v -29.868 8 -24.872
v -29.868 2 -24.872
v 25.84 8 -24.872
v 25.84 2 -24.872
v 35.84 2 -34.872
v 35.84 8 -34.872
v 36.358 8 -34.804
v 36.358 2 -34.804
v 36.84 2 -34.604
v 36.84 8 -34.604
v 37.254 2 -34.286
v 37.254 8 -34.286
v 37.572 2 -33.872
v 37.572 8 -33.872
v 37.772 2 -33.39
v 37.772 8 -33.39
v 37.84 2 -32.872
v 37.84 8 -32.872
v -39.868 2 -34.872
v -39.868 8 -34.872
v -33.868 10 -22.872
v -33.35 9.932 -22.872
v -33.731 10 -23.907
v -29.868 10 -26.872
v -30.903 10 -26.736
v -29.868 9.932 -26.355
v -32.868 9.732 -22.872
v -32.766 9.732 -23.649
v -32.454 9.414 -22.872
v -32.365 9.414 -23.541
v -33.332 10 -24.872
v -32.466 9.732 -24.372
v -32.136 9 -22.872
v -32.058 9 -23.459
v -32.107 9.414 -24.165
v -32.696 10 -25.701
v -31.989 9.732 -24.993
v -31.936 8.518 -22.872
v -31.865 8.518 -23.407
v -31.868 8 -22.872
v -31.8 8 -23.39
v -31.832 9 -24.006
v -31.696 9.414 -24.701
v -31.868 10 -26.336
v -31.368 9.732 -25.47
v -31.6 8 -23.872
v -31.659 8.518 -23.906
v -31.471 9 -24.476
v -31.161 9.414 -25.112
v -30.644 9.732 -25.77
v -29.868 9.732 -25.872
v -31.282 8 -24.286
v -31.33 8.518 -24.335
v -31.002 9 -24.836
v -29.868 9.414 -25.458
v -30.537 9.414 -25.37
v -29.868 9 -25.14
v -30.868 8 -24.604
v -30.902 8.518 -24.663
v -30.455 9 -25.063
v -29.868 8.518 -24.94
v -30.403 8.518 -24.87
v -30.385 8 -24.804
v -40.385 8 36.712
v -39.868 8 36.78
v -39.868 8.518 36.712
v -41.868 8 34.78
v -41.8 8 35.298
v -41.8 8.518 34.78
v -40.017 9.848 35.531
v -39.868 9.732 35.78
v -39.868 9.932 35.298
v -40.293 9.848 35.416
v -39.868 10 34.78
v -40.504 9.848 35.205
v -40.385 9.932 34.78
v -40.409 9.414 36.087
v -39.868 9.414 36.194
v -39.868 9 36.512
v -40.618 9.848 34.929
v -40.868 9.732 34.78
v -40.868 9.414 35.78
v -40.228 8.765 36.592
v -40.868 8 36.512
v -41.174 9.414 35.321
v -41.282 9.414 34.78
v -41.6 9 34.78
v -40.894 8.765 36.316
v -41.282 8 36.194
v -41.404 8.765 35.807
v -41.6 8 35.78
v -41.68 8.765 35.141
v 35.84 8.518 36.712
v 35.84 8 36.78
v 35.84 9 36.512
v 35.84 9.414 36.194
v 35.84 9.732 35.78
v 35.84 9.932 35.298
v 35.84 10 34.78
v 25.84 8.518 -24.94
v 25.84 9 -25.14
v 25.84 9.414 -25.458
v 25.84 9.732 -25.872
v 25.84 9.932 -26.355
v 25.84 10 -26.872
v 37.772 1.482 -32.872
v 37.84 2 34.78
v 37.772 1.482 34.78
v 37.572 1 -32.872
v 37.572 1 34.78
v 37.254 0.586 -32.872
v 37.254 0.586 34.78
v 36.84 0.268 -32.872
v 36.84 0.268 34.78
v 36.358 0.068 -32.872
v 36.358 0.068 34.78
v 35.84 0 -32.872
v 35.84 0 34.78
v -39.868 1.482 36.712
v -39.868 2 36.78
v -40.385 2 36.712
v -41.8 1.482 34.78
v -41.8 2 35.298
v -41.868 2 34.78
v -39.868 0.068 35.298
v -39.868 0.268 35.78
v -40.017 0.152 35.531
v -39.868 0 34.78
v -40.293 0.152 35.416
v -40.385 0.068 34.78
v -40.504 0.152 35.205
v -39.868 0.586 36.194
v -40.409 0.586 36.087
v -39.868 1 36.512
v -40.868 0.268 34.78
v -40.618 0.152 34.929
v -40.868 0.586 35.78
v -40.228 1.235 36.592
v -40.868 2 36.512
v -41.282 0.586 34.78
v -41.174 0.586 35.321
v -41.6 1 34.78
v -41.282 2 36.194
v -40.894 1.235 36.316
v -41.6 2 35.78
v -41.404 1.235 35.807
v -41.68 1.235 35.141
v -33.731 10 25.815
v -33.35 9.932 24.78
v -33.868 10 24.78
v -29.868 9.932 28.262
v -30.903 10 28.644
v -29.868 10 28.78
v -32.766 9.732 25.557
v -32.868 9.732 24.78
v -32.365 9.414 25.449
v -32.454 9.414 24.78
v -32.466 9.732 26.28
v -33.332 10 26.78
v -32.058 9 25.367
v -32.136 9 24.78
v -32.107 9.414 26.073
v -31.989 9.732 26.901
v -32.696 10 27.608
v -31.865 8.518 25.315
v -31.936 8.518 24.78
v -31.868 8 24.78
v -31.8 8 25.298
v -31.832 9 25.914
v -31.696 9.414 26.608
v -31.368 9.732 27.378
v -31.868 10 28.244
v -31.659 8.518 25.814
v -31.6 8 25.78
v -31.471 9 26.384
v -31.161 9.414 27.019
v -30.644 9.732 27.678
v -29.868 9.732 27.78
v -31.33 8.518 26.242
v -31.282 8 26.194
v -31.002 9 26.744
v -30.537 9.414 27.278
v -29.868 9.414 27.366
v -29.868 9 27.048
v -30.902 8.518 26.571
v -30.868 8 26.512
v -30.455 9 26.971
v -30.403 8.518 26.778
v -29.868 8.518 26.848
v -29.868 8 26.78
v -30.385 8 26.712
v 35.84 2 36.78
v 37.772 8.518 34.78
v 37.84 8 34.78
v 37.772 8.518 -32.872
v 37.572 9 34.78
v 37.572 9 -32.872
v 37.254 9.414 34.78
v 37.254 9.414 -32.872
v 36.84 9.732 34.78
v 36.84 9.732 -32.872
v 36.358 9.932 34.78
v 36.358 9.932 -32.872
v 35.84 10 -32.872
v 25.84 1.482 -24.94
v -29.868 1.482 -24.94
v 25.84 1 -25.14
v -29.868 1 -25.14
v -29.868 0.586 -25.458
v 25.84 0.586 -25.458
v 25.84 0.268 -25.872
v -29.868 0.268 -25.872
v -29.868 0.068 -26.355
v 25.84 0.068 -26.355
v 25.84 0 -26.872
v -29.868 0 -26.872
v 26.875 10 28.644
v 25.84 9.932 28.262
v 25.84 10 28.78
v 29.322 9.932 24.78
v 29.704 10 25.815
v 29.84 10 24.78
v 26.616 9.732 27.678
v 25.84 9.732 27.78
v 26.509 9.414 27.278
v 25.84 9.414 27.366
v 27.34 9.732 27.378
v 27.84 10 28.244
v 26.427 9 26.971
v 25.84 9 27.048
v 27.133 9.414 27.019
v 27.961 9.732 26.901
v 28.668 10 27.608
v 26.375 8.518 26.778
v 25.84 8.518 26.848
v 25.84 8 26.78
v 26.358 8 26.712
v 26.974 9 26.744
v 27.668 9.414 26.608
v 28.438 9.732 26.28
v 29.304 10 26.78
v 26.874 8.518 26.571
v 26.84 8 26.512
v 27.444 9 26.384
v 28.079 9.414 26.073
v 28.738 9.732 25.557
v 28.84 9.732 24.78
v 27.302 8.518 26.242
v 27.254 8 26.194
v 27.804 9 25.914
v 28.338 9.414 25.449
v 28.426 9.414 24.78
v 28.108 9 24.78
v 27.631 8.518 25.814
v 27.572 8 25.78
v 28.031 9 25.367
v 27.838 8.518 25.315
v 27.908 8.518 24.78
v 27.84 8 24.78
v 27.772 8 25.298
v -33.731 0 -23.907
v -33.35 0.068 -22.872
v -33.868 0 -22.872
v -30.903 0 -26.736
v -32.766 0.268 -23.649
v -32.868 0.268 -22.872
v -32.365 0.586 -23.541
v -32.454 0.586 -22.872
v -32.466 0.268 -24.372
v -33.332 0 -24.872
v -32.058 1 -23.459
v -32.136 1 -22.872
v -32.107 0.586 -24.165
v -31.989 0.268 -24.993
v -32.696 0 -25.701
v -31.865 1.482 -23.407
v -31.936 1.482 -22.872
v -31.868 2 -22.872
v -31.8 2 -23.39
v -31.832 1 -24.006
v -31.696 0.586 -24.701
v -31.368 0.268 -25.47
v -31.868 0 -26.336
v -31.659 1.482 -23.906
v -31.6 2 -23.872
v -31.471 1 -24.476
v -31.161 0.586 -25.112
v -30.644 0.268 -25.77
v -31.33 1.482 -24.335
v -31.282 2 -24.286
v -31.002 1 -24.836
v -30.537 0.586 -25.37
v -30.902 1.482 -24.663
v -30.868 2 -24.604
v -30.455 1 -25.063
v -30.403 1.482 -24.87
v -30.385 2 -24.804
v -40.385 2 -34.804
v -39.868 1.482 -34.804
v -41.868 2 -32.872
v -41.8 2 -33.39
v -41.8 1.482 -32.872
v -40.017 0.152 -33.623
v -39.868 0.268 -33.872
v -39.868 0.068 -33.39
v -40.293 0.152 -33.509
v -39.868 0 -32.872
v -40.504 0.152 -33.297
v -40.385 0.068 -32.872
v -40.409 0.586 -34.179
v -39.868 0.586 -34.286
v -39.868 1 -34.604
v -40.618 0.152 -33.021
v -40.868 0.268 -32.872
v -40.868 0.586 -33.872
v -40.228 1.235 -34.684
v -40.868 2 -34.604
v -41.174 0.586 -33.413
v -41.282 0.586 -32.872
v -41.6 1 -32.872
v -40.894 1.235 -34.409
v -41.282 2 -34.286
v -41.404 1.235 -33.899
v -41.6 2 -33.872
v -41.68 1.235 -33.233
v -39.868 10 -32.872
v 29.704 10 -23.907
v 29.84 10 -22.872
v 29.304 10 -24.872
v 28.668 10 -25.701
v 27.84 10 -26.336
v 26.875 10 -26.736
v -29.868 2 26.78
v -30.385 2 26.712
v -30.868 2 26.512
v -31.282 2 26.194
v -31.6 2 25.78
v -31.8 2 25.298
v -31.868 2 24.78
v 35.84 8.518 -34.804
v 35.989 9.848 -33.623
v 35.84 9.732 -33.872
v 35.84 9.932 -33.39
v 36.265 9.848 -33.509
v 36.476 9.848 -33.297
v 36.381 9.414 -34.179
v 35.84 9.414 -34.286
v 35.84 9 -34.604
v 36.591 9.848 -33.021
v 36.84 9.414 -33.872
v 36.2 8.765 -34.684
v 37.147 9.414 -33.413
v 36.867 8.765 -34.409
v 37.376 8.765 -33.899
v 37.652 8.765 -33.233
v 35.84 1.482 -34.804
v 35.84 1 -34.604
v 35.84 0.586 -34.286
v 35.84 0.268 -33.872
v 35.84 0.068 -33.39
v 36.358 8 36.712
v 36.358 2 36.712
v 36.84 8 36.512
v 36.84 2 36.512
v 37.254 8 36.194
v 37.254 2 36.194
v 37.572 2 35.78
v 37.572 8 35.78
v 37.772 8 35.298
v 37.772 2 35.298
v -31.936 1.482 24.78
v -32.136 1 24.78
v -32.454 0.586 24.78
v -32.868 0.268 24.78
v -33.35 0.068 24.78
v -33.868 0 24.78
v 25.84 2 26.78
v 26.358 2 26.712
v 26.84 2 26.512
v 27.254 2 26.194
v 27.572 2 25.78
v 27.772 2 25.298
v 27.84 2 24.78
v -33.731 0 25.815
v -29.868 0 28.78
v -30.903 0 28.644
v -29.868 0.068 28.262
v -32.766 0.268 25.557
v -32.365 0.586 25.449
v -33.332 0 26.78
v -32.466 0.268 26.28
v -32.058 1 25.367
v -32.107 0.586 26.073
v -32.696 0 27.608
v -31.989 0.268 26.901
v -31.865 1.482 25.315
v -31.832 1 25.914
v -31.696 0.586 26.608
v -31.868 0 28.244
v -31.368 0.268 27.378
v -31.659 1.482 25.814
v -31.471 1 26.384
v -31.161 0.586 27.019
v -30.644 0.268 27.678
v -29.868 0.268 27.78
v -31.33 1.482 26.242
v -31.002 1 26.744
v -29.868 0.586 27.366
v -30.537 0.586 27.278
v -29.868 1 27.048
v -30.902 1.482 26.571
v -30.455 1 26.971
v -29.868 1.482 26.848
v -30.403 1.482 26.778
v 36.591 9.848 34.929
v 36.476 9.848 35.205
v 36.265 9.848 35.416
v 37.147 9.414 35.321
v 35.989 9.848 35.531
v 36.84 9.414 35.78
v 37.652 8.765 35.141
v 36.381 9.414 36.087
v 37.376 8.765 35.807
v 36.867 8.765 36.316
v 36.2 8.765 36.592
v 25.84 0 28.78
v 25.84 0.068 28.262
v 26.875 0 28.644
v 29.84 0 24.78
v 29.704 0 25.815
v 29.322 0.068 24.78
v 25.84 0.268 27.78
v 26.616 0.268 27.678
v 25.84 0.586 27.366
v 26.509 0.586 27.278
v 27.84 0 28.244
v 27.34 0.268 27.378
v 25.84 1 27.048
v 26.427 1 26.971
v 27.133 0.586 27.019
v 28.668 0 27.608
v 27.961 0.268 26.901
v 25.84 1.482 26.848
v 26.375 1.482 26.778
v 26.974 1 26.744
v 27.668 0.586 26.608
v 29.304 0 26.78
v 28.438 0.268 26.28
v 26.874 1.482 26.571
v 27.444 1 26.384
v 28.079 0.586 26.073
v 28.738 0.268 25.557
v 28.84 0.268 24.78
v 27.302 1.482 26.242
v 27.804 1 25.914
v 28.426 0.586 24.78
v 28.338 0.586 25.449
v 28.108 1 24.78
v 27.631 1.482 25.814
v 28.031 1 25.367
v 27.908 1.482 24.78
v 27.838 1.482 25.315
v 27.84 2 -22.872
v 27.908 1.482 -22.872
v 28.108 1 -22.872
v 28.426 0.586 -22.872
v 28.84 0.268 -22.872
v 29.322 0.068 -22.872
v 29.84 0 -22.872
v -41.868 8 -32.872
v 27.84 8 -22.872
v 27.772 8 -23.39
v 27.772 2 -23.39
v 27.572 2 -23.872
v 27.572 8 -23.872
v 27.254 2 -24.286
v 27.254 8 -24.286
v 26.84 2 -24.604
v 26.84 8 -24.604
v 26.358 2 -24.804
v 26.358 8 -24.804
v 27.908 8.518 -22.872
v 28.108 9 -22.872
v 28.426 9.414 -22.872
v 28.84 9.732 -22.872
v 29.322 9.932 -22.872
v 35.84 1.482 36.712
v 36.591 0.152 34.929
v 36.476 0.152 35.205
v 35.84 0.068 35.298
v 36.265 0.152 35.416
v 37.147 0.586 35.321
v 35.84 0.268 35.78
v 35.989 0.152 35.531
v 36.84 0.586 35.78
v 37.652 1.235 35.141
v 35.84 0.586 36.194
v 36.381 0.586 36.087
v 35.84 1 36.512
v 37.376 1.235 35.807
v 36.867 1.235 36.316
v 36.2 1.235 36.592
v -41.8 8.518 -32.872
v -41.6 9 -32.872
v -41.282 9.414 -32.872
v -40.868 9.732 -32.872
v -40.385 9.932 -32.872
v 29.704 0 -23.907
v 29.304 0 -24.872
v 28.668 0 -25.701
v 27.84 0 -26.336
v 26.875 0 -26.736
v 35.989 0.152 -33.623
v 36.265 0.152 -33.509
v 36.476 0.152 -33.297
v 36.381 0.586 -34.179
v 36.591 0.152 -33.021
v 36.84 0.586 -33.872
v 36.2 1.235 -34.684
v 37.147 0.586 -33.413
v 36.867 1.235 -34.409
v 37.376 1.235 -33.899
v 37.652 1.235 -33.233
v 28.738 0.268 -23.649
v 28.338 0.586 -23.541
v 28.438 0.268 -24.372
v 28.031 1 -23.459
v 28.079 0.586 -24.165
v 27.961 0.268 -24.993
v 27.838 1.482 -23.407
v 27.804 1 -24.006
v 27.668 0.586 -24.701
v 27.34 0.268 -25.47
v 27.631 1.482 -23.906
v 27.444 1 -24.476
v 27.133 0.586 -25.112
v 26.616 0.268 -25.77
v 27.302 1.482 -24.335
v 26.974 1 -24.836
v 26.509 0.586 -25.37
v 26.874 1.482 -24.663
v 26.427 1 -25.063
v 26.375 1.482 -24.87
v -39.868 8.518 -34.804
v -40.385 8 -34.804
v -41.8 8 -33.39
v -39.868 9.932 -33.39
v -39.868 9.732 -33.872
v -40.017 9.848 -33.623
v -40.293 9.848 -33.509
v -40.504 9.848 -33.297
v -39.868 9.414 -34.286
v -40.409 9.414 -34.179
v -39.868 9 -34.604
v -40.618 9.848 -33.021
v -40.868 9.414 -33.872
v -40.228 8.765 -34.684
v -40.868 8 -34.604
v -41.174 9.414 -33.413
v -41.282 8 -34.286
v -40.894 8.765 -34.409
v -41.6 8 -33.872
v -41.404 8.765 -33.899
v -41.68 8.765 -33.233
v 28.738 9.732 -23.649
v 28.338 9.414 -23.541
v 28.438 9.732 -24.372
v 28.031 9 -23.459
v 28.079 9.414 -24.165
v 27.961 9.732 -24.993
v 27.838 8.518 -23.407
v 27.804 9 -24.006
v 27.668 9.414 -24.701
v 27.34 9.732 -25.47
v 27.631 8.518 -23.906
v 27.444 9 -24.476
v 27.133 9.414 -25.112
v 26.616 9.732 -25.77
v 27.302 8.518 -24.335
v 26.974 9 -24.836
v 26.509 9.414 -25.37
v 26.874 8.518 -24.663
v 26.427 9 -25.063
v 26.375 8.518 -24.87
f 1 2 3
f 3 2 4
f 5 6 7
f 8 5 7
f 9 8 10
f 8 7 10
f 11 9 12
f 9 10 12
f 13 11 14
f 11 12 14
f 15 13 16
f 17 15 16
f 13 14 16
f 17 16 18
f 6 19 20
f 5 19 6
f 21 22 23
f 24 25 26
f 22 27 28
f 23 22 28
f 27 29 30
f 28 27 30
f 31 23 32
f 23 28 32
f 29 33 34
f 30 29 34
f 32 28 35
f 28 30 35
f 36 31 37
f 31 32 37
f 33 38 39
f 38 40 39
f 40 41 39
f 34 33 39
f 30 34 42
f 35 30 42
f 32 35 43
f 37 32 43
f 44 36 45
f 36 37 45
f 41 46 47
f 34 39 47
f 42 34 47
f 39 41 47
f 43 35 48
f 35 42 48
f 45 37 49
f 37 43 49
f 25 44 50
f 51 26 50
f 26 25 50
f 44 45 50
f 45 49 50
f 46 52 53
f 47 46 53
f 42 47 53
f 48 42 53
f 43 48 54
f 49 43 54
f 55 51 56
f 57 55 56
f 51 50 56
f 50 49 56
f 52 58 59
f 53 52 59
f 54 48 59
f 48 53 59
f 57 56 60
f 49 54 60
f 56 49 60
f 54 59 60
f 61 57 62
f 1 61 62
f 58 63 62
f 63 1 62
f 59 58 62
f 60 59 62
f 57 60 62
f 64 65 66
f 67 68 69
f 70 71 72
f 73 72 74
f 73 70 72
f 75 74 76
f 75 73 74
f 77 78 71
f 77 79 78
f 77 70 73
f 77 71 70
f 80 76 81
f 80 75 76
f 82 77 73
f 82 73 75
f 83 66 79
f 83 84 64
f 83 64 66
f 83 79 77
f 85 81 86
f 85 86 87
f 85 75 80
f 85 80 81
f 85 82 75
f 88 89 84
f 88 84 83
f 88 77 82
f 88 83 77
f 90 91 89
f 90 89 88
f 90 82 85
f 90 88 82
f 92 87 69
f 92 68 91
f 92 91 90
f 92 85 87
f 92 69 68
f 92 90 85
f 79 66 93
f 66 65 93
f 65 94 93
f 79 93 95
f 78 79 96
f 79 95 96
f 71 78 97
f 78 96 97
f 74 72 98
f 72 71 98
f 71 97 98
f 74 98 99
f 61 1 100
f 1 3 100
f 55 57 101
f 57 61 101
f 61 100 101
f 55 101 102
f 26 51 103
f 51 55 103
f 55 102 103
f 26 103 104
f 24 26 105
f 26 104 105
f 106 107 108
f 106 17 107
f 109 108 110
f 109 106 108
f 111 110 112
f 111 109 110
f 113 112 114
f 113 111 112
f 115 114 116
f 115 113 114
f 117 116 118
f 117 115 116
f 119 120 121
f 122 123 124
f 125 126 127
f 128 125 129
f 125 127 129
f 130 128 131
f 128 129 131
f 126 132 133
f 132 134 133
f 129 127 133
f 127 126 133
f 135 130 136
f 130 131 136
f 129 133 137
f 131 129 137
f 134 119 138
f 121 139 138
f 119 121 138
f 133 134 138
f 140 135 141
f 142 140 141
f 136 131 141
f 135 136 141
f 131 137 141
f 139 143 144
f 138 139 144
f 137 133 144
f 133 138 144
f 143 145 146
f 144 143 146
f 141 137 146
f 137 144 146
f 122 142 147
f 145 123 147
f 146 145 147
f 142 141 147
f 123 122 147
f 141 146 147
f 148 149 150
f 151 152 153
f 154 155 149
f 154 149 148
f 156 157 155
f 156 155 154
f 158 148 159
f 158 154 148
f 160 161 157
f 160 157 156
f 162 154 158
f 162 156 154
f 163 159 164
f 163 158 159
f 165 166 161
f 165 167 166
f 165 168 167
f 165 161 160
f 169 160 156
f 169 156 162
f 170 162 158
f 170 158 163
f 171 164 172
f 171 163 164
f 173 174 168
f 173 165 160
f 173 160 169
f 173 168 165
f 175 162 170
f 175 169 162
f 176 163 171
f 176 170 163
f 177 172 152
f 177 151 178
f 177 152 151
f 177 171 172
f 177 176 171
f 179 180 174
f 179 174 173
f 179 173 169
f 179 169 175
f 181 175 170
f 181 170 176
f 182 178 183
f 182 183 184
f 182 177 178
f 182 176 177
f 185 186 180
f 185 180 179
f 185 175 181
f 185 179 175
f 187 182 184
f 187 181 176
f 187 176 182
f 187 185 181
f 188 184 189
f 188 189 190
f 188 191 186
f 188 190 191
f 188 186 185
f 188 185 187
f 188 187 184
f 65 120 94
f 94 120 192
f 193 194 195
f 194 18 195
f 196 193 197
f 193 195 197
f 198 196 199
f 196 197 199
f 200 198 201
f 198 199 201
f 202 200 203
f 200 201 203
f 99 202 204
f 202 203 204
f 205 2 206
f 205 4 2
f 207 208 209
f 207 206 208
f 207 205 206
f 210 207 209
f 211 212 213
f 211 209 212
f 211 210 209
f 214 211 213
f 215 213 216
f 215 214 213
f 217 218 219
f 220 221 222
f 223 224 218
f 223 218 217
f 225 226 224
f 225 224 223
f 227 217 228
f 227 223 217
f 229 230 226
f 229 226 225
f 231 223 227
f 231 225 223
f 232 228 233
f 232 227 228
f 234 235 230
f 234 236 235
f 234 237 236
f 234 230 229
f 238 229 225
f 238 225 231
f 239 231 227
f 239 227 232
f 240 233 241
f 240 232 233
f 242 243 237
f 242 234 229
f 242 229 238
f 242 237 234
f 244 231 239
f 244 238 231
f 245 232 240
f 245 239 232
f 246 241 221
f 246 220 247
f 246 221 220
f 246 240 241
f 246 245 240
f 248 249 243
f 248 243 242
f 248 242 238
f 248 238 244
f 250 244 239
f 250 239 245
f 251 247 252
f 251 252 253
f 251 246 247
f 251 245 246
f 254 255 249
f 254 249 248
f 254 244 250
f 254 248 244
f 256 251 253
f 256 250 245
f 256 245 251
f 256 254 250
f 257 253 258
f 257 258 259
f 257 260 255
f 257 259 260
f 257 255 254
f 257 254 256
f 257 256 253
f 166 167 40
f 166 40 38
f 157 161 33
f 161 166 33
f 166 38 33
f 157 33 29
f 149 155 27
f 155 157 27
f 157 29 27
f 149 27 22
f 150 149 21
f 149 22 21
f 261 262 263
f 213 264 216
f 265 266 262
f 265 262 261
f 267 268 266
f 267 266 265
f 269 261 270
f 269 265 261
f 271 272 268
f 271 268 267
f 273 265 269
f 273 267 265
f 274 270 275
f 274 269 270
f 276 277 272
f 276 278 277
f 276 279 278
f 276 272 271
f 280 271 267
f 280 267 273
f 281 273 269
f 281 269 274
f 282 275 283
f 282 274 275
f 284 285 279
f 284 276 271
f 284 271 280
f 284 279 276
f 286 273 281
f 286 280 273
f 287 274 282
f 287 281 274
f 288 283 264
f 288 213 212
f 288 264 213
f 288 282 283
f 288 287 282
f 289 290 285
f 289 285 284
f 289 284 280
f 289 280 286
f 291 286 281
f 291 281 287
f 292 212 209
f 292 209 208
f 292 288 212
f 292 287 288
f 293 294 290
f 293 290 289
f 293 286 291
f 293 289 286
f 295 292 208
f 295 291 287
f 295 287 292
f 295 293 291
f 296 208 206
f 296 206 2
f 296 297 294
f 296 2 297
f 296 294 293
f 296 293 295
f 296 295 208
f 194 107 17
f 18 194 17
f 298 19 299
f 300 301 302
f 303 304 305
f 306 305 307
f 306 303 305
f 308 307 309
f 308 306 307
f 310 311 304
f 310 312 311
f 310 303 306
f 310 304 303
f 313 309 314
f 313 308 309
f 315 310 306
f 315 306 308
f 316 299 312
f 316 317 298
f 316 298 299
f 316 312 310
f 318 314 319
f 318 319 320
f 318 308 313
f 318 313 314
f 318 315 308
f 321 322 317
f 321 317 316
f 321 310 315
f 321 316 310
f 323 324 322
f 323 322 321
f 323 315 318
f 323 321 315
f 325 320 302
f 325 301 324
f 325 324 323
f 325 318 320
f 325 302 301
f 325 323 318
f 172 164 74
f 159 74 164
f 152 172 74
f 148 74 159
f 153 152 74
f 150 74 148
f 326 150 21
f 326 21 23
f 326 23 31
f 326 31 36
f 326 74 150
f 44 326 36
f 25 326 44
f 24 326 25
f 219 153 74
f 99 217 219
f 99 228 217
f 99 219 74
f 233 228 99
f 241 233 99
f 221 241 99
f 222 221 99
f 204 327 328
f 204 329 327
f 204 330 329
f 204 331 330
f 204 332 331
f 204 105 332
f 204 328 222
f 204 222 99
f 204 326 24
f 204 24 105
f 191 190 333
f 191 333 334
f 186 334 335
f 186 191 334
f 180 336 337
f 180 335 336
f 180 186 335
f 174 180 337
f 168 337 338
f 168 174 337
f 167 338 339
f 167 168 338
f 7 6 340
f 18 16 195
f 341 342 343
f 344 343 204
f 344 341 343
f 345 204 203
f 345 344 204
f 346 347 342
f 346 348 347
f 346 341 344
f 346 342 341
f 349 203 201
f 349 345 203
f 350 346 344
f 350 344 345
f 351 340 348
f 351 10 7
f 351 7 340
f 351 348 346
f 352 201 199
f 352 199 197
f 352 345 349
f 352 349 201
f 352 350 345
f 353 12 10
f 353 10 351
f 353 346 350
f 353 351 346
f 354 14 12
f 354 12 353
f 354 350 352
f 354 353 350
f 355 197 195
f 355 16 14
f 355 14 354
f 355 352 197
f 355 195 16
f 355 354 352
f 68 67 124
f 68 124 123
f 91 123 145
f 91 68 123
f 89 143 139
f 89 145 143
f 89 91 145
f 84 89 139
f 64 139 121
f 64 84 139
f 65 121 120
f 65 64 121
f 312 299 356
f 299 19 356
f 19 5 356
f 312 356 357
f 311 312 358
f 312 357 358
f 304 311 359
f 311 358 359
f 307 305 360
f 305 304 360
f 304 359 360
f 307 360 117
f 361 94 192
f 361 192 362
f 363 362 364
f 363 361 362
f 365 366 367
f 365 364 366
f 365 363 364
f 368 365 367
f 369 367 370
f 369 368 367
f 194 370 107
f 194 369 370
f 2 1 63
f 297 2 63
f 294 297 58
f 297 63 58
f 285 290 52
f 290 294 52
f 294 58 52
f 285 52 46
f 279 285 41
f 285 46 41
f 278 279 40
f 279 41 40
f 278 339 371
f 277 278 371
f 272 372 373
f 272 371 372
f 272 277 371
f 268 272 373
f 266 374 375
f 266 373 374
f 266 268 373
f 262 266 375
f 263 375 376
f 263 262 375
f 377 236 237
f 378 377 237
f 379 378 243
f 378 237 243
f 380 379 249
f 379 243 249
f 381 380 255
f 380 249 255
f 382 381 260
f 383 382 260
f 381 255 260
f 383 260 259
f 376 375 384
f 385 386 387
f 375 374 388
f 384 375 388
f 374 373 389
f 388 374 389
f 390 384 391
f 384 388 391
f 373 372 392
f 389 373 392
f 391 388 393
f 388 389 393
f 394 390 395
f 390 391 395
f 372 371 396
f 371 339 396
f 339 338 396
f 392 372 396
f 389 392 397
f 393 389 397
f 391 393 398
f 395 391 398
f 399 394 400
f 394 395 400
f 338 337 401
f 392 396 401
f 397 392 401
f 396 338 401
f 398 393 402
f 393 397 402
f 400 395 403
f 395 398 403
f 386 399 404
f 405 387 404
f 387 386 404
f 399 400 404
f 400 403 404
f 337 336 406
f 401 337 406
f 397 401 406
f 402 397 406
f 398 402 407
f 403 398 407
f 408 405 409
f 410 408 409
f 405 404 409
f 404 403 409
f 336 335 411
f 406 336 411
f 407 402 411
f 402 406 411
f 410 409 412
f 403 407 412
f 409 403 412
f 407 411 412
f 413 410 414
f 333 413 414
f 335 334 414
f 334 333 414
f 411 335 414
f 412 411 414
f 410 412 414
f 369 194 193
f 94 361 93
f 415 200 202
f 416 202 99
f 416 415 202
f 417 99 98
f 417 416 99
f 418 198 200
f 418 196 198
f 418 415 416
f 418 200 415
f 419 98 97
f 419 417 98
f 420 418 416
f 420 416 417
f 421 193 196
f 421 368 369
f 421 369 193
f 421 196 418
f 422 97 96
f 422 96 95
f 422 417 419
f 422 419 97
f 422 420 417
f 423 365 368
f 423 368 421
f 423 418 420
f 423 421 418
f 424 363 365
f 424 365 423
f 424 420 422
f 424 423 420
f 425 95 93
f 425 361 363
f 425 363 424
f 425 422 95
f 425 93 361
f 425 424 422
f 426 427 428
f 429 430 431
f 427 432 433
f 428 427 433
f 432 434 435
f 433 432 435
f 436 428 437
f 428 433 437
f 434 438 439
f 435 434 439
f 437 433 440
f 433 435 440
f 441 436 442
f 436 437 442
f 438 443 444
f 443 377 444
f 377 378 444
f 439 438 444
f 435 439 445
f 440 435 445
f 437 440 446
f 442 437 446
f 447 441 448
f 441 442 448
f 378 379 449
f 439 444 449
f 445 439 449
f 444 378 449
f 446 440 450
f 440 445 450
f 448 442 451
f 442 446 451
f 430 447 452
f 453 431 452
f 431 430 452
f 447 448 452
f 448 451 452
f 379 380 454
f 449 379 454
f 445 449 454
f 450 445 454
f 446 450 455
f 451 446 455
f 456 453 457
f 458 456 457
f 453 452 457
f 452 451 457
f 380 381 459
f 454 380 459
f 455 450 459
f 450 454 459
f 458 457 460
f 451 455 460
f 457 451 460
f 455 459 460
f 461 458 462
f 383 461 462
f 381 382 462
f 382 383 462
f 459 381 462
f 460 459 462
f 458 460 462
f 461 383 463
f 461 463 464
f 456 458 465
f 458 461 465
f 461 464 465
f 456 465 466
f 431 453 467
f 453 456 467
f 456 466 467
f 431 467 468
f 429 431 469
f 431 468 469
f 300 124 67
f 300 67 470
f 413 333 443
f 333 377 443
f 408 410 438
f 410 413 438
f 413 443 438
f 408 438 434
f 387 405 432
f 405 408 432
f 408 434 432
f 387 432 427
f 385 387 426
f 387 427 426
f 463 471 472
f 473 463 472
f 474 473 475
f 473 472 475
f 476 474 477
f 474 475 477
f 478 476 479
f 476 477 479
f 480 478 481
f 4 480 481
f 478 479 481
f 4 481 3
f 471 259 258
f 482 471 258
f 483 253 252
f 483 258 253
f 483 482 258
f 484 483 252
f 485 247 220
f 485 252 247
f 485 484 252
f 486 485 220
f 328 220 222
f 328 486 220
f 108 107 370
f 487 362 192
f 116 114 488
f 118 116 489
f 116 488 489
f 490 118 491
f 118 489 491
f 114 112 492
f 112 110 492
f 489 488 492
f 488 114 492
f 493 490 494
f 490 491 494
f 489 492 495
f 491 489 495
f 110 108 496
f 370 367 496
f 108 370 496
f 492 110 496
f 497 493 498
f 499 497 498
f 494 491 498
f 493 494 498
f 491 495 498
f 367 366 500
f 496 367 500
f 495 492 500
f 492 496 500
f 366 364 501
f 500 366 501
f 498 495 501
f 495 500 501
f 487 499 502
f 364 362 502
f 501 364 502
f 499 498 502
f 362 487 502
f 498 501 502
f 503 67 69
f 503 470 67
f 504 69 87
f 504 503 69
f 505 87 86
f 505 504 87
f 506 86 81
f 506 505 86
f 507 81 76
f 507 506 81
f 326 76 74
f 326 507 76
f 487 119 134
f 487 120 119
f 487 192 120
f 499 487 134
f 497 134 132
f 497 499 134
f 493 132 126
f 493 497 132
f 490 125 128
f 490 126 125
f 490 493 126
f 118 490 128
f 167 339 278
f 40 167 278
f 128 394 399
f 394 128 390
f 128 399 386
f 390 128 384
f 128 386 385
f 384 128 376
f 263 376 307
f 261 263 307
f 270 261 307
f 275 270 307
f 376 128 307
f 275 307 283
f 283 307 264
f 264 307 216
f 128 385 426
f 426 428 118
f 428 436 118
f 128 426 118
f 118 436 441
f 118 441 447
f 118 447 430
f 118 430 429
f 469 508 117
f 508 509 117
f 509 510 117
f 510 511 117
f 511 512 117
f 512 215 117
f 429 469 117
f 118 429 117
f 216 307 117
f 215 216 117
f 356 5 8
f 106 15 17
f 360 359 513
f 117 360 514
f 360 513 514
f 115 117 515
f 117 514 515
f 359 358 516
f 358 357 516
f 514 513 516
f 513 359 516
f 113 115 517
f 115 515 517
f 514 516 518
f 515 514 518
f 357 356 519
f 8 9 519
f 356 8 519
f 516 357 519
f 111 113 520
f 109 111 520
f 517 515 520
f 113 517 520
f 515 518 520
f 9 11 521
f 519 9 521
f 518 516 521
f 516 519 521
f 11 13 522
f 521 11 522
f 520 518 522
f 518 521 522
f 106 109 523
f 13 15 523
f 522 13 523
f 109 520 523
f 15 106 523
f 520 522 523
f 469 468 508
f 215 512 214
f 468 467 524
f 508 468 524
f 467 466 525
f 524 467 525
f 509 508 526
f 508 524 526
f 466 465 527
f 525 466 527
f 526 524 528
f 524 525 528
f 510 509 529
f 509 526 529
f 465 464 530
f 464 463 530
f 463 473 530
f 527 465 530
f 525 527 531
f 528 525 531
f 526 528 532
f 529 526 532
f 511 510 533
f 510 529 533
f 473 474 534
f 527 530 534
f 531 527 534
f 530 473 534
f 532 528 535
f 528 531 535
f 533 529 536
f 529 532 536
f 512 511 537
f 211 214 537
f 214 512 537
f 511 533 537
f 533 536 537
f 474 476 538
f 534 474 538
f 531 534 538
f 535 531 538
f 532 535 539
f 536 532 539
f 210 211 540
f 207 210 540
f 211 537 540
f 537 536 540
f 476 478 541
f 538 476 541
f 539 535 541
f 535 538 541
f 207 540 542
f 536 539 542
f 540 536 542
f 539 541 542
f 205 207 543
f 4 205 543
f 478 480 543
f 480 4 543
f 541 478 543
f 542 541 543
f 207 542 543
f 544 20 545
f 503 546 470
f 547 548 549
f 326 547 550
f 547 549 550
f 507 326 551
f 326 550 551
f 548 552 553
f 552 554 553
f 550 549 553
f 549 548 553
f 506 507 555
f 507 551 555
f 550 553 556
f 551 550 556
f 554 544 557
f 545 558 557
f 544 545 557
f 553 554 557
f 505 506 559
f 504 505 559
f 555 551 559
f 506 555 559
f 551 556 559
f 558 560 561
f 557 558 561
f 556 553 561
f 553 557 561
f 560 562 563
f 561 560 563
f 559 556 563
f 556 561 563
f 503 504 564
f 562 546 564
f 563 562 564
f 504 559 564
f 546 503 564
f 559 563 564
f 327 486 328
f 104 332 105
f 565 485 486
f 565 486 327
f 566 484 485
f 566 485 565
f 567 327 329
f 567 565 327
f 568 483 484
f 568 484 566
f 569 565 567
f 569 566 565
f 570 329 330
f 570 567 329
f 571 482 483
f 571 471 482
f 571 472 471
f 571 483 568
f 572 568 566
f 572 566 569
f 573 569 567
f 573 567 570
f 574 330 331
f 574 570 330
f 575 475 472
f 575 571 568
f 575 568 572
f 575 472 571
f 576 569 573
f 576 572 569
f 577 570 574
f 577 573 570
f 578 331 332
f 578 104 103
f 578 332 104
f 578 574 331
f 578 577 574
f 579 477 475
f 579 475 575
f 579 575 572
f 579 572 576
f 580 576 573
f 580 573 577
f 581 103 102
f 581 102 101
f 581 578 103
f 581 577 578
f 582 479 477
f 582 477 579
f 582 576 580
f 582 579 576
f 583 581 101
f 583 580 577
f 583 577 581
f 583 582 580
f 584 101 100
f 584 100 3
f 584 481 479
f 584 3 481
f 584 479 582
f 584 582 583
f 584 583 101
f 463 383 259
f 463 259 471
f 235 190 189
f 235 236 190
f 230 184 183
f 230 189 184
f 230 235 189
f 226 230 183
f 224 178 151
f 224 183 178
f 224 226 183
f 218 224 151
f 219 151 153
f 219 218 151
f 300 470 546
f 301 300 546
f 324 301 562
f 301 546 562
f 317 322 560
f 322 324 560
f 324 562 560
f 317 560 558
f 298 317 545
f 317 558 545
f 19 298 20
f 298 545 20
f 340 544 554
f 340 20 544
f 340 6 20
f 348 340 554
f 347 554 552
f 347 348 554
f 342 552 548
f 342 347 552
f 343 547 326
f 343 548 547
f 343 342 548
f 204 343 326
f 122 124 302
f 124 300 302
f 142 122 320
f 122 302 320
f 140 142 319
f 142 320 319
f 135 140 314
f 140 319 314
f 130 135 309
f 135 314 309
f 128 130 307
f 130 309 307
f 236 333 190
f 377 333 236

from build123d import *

# Parameters (mm, degrees)
SKETCH1_W      = 79.70776103
SKETCH1_H      = 71.652189437
SKETCH1_W_2    = 59.70776103
SKETCH1_H_2    = 51.652189437
EXTRUDE1_DEPTH = 10
FILLET1_R      = 2


with BuildPart() as part:
    # Sketch1 → Extrude1 (new body)
    with BuildSketch(Plane(origin=(0, 0, 0), x_dir=(1, 0, 0), z_dir=(0, 1, 0))):
        with Locations((-2.013892898, -0.953949268)):
            Rectangle(SKETCH1_W, SKETCH1_H)
        with Locations((-2.013892898, -0.953949268)):
            Rectangle(SKETCH1_W_2, SKETCH1_H_2, mode=Mode.SUBTRACT)
    extrude(amount=EXTRUDE1_DEPTH)

    # Fillet1
    fillet1_edges = [part.edges().sort_by_distance(p)[0] for p in [
        (-41.867773413, 5, -34.872145451),
        (37.839987617, 5, -34.872145451),
        (-2.013892898, 0, -34.872145451),
        (-2.013892898, 10, -34.872145451),
        (37.839987617, 5, 36.780043986),
        (37.839987617, 0, 0.953949268),
        (37.839987617, 10, 0.953949268),
        (-41.867773413, 5, 36.780043986),
        (-2.013892898, 0, 36.780043986),
        (-2.013892898, 10, 36.780043986),
        (-41.867773413, 0, 0.953949268),
        (-41.867773413, 10, 0.953949268),
        (-31.867773413, 5, -24.872145451),
        (-31.867773413, 5, 26.780043986),
        (-31.867773413, 0, 0.953949268),
        (-31.867773413, 10, 0.953949268),
        (27.839987617, 5, 26.780043986),
        (-2.013892898, 0, 26.780043986),
        (-2.013892898, 10, 26.780043986),
        (27.839987617, 5, -24.872145451),
        (27.839987617, 0, 0.953949268),
        (27.839987617, 10, 0.953949268),
        (-2.013892898, 0, -24.872145451),
        (-2.013892898, 10, -24.872145451),
    ]]
    fillet(fillet1_edges, radius=FILLET1_R)


solid = part.part
